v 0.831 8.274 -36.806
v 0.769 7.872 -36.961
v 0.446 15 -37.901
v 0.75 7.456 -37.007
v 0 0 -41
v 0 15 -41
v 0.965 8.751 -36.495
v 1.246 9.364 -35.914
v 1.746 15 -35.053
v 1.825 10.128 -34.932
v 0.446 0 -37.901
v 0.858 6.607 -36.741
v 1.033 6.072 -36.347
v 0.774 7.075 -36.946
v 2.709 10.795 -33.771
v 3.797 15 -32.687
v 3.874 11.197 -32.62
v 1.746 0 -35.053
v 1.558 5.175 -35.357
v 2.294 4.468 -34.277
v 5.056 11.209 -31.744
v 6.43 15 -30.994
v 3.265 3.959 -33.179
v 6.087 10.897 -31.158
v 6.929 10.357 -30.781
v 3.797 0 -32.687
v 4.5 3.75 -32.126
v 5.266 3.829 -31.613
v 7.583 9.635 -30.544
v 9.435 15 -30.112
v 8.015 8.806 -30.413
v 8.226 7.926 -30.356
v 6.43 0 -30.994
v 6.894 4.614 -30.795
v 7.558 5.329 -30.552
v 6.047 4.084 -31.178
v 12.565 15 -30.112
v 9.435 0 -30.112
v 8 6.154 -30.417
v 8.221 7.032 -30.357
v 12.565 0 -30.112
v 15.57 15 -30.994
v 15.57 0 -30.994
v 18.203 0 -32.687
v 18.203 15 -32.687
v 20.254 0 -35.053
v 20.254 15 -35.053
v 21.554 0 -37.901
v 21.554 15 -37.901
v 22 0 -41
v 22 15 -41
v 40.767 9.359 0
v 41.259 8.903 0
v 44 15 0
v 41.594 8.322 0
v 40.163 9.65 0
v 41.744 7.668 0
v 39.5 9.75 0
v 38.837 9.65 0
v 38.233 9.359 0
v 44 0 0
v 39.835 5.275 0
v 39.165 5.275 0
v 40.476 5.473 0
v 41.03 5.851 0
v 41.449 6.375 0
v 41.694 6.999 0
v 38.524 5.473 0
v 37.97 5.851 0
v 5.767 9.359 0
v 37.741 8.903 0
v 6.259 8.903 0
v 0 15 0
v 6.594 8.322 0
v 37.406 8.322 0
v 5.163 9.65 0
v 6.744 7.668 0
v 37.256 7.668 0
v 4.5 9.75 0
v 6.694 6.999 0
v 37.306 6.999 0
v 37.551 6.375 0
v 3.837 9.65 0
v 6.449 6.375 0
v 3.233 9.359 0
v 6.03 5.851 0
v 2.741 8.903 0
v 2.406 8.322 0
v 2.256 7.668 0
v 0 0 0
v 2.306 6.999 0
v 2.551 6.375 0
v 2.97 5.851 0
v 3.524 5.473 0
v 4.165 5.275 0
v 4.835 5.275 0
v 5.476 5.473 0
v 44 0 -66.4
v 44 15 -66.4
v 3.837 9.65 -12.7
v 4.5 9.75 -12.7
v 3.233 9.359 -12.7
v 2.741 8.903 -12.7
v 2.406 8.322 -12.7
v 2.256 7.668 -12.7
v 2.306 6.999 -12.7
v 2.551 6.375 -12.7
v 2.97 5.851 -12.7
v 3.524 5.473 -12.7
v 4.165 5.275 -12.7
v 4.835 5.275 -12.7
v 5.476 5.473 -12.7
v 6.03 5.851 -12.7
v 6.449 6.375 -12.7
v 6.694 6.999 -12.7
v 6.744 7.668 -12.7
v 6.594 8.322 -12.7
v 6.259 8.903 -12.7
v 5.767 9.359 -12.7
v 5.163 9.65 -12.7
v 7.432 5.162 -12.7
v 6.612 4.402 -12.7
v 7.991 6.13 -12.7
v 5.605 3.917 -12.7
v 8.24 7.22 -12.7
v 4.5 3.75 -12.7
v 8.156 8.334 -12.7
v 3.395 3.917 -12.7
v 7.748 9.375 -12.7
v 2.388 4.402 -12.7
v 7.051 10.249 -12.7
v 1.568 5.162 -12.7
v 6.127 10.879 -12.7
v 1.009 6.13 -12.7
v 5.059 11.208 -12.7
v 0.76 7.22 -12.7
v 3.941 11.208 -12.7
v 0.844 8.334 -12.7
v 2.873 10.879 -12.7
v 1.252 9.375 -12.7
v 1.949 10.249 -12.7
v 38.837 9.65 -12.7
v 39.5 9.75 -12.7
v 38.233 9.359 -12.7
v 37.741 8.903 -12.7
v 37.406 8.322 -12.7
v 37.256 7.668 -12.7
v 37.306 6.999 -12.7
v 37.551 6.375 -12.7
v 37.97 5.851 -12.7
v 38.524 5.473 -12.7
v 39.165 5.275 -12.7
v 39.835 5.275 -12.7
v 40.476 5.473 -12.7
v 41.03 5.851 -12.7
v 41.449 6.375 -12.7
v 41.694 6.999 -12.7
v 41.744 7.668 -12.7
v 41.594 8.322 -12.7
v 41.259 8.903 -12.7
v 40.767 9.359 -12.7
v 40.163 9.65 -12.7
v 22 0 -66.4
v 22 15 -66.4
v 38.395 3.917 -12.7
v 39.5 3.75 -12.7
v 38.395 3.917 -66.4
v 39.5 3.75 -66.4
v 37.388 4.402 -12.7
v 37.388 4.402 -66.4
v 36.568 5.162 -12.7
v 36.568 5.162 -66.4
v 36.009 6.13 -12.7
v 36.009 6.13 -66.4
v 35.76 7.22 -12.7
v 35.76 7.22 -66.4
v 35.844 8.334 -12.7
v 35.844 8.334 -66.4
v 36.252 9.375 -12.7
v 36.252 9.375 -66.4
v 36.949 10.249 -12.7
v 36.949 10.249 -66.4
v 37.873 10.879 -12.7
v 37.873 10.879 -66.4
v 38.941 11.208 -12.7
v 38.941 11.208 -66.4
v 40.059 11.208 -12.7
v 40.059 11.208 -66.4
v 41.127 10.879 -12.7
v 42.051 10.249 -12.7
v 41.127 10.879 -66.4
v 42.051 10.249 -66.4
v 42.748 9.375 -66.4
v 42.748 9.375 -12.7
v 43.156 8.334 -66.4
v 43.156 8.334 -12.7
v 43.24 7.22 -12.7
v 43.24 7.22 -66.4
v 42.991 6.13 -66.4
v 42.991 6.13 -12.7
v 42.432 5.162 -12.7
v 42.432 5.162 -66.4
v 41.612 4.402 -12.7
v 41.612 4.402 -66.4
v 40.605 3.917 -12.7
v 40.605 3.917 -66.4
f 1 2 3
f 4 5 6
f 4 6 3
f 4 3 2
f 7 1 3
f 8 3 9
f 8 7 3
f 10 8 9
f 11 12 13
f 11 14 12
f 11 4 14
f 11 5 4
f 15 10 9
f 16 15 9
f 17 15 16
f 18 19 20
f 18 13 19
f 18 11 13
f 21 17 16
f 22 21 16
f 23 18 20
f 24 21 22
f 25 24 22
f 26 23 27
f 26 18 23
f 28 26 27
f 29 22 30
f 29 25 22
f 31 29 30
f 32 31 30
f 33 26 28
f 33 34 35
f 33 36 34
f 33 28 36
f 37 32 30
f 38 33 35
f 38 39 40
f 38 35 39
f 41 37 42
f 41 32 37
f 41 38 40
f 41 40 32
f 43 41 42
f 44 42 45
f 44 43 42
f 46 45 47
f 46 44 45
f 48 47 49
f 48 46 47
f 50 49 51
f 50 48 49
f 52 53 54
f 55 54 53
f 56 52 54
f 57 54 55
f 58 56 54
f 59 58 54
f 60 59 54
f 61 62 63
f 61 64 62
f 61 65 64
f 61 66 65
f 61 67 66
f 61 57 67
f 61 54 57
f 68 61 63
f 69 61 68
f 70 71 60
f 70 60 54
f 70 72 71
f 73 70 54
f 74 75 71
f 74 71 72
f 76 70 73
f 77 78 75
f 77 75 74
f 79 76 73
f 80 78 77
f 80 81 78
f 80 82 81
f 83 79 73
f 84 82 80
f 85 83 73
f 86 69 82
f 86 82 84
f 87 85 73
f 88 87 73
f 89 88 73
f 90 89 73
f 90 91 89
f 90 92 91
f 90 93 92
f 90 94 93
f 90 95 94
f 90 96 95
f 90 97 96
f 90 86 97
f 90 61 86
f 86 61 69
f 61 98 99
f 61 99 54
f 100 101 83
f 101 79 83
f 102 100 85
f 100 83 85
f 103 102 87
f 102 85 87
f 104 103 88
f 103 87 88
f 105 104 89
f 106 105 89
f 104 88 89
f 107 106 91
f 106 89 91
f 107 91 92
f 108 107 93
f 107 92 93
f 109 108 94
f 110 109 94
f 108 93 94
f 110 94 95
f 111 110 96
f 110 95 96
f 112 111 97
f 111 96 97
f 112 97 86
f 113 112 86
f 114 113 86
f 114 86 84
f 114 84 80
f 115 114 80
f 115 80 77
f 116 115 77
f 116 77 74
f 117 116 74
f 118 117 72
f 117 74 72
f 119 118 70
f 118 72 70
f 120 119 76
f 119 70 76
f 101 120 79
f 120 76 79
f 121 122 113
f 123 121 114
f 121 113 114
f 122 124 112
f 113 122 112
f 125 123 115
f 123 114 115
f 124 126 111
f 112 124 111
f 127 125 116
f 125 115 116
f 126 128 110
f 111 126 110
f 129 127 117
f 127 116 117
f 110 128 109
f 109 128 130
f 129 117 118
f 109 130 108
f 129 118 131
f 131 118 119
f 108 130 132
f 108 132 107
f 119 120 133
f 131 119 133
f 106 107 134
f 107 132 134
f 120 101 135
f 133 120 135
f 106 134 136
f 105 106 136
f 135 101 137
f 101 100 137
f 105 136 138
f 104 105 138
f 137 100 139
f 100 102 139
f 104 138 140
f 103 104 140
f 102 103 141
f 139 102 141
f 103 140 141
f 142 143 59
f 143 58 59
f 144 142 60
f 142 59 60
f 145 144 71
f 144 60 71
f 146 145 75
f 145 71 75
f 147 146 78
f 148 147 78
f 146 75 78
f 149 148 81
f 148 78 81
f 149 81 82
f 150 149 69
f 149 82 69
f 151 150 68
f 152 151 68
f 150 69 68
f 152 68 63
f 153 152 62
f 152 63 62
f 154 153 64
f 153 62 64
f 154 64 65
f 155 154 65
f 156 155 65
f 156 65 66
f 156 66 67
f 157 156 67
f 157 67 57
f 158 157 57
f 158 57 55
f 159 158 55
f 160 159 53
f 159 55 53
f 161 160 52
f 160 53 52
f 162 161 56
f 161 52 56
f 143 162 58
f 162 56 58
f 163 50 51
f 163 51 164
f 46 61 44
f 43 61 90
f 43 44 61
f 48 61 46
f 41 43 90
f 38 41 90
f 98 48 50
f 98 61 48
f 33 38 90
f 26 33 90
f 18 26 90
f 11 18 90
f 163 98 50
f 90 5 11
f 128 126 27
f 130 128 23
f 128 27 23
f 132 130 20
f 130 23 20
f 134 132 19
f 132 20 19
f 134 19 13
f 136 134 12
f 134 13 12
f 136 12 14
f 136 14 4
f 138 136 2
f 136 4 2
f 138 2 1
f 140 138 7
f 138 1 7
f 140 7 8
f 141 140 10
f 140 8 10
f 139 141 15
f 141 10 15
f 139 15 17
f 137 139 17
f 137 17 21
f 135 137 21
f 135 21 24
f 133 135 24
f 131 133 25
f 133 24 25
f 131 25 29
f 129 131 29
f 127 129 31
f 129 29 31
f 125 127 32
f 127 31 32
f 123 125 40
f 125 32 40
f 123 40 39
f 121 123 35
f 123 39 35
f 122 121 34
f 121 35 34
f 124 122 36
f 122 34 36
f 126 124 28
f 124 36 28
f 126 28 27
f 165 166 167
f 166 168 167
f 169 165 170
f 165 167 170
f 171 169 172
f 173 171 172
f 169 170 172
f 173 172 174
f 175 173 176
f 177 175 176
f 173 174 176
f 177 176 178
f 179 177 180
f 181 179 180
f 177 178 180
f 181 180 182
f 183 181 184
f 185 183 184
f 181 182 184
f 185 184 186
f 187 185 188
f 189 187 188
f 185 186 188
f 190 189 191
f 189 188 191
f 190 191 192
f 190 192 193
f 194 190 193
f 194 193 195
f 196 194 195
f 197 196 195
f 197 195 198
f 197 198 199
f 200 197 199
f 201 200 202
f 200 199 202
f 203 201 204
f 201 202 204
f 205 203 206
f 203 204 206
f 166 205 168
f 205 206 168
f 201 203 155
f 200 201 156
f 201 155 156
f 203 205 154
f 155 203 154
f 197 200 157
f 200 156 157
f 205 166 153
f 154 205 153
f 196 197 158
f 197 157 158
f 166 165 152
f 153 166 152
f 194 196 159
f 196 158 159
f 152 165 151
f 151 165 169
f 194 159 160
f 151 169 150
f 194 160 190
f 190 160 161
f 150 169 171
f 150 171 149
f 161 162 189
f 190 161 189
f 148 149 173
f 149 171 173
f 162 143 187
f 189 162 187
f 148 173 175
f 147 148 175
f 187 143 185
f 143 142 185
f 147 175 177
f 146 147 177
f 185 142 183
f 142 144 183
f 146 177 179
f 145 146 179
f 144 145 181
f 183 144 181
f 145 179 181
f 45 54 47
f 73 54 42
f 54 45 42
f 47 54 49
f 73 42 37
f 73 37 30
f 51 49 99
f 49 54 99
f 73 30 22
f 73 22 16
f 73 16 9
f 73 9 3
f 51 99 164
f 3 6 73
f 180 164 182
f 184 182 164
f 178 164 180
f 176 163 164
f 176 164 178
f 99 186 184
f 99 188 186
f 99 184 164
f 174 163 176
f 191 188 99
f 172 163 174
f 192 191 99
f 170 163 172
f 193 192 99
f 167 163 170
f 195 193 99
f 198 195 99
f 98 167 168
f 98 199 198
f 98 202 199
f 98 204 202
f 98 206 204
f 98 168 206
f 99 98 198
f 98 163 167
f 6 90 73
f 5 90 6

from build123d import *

# Parameters (mm, degrees)
BOSS_EXTRUDE1_DEPTH            = 15
SKETCH11_W                     = 2.25
SKETCH11_H                     = 12.7
M4_CLEARANCE_HOLE5_AT_2_COUNT  = 2
M4_CLEARANCE_HOLE5_AT_2_PITCH  = 35
SKETCH13_W                     = 3.75
SKETCH13_H                     = 53.7
F_6_0MM_DOWEL_HOLE1_AT_2_COUNT = 2
F_6_0MM_DOWEL_HOLE1_AT_2_PITCH = 35


with BuildPart() as part:
    # Sketch1 → Boss-Extrude1 (new body)
    with BuildSketch(Plane(origin=(0, 0, 0), x_dir=(1, 0, 0), z_dir=(0, 1, 0))):
        with BuildLine():
            Line((0, 0), (0, 41))
            ThreePointArc((0, 41), (11, 30), (22, 41))
            Line((22, 41), (22, 66.4))
            Line((22, 66.4), (44, 66.4))
            Line((44, 66.4), (44, 41))
            Line((44, 41), (44, 0))
            Line((44, 0), (0, 0))
        make_face()
    extrude(amount=BOSS_EXTRUDE1_DEPTH)

    # Sketch11 → M4 Clearance Hole5 (revolve, cut)
    with BuildSketch(Plane(origin=(39.5, 7.5, -12.7), x_dir=(0, 1, 0), z_dir=(1, 0, 0))):
        with Locations((1.125, 6.35)):
            Rectangle(SKETCH11_W, SKETCH11_H)
    m4_clearance_hole5 = revolve(axis=Axis((39.5, 7.5, -19.05), (0, 0, 1)), mode=Mode.SUBTRACT)

    # M4 Clearance Hole5 at 2: M4 Clearance Hole5 ×2
    with Locations(*[(-i * M4_CLEARANCE_HOLE5_AT_2_PITCH, 0, 0) for i in range(1, M4_CLEARANCE_HOLE5_AT_2_COUNT)]):
        add(m4_clearance_hole5, mode=Mode.SUBTRACT)

    # Sketch13 → Ø6.0mm Dowel Hole1 (revolve, cut)
    with BuildSketch(Plane(origin=(39.5, 7.5, -12.7), x_dir=(0, -1, 0), z_dir=(1, 0, 0))):
        with Locations((1.875, 26.85)):
            Rectangle(SKETCH13_W, SKETCH13_H)
    f_6_0mm_dowel_hole1 = revolve(axis=Axis((39.5, 7.5, -6.35), (0, 0, -1)), mode=Mode.SUBTRACT)

    # Ø6.0mm Dowel Hole1 at 2: Ø6.0mm Dowel Hole1 ×2
    with Locations(*[(-i * F_6_0MM_DOWEL_HOLE1_AT_2_PITCH, 0, 0) for i in range(1, F_6_0MM_DOWEL_HOLE1_AT_2_COUNT)]):
        add(f_6_0mm_dowel_hole1, mode=Mode.SUBTRACT)


solid = part.part
